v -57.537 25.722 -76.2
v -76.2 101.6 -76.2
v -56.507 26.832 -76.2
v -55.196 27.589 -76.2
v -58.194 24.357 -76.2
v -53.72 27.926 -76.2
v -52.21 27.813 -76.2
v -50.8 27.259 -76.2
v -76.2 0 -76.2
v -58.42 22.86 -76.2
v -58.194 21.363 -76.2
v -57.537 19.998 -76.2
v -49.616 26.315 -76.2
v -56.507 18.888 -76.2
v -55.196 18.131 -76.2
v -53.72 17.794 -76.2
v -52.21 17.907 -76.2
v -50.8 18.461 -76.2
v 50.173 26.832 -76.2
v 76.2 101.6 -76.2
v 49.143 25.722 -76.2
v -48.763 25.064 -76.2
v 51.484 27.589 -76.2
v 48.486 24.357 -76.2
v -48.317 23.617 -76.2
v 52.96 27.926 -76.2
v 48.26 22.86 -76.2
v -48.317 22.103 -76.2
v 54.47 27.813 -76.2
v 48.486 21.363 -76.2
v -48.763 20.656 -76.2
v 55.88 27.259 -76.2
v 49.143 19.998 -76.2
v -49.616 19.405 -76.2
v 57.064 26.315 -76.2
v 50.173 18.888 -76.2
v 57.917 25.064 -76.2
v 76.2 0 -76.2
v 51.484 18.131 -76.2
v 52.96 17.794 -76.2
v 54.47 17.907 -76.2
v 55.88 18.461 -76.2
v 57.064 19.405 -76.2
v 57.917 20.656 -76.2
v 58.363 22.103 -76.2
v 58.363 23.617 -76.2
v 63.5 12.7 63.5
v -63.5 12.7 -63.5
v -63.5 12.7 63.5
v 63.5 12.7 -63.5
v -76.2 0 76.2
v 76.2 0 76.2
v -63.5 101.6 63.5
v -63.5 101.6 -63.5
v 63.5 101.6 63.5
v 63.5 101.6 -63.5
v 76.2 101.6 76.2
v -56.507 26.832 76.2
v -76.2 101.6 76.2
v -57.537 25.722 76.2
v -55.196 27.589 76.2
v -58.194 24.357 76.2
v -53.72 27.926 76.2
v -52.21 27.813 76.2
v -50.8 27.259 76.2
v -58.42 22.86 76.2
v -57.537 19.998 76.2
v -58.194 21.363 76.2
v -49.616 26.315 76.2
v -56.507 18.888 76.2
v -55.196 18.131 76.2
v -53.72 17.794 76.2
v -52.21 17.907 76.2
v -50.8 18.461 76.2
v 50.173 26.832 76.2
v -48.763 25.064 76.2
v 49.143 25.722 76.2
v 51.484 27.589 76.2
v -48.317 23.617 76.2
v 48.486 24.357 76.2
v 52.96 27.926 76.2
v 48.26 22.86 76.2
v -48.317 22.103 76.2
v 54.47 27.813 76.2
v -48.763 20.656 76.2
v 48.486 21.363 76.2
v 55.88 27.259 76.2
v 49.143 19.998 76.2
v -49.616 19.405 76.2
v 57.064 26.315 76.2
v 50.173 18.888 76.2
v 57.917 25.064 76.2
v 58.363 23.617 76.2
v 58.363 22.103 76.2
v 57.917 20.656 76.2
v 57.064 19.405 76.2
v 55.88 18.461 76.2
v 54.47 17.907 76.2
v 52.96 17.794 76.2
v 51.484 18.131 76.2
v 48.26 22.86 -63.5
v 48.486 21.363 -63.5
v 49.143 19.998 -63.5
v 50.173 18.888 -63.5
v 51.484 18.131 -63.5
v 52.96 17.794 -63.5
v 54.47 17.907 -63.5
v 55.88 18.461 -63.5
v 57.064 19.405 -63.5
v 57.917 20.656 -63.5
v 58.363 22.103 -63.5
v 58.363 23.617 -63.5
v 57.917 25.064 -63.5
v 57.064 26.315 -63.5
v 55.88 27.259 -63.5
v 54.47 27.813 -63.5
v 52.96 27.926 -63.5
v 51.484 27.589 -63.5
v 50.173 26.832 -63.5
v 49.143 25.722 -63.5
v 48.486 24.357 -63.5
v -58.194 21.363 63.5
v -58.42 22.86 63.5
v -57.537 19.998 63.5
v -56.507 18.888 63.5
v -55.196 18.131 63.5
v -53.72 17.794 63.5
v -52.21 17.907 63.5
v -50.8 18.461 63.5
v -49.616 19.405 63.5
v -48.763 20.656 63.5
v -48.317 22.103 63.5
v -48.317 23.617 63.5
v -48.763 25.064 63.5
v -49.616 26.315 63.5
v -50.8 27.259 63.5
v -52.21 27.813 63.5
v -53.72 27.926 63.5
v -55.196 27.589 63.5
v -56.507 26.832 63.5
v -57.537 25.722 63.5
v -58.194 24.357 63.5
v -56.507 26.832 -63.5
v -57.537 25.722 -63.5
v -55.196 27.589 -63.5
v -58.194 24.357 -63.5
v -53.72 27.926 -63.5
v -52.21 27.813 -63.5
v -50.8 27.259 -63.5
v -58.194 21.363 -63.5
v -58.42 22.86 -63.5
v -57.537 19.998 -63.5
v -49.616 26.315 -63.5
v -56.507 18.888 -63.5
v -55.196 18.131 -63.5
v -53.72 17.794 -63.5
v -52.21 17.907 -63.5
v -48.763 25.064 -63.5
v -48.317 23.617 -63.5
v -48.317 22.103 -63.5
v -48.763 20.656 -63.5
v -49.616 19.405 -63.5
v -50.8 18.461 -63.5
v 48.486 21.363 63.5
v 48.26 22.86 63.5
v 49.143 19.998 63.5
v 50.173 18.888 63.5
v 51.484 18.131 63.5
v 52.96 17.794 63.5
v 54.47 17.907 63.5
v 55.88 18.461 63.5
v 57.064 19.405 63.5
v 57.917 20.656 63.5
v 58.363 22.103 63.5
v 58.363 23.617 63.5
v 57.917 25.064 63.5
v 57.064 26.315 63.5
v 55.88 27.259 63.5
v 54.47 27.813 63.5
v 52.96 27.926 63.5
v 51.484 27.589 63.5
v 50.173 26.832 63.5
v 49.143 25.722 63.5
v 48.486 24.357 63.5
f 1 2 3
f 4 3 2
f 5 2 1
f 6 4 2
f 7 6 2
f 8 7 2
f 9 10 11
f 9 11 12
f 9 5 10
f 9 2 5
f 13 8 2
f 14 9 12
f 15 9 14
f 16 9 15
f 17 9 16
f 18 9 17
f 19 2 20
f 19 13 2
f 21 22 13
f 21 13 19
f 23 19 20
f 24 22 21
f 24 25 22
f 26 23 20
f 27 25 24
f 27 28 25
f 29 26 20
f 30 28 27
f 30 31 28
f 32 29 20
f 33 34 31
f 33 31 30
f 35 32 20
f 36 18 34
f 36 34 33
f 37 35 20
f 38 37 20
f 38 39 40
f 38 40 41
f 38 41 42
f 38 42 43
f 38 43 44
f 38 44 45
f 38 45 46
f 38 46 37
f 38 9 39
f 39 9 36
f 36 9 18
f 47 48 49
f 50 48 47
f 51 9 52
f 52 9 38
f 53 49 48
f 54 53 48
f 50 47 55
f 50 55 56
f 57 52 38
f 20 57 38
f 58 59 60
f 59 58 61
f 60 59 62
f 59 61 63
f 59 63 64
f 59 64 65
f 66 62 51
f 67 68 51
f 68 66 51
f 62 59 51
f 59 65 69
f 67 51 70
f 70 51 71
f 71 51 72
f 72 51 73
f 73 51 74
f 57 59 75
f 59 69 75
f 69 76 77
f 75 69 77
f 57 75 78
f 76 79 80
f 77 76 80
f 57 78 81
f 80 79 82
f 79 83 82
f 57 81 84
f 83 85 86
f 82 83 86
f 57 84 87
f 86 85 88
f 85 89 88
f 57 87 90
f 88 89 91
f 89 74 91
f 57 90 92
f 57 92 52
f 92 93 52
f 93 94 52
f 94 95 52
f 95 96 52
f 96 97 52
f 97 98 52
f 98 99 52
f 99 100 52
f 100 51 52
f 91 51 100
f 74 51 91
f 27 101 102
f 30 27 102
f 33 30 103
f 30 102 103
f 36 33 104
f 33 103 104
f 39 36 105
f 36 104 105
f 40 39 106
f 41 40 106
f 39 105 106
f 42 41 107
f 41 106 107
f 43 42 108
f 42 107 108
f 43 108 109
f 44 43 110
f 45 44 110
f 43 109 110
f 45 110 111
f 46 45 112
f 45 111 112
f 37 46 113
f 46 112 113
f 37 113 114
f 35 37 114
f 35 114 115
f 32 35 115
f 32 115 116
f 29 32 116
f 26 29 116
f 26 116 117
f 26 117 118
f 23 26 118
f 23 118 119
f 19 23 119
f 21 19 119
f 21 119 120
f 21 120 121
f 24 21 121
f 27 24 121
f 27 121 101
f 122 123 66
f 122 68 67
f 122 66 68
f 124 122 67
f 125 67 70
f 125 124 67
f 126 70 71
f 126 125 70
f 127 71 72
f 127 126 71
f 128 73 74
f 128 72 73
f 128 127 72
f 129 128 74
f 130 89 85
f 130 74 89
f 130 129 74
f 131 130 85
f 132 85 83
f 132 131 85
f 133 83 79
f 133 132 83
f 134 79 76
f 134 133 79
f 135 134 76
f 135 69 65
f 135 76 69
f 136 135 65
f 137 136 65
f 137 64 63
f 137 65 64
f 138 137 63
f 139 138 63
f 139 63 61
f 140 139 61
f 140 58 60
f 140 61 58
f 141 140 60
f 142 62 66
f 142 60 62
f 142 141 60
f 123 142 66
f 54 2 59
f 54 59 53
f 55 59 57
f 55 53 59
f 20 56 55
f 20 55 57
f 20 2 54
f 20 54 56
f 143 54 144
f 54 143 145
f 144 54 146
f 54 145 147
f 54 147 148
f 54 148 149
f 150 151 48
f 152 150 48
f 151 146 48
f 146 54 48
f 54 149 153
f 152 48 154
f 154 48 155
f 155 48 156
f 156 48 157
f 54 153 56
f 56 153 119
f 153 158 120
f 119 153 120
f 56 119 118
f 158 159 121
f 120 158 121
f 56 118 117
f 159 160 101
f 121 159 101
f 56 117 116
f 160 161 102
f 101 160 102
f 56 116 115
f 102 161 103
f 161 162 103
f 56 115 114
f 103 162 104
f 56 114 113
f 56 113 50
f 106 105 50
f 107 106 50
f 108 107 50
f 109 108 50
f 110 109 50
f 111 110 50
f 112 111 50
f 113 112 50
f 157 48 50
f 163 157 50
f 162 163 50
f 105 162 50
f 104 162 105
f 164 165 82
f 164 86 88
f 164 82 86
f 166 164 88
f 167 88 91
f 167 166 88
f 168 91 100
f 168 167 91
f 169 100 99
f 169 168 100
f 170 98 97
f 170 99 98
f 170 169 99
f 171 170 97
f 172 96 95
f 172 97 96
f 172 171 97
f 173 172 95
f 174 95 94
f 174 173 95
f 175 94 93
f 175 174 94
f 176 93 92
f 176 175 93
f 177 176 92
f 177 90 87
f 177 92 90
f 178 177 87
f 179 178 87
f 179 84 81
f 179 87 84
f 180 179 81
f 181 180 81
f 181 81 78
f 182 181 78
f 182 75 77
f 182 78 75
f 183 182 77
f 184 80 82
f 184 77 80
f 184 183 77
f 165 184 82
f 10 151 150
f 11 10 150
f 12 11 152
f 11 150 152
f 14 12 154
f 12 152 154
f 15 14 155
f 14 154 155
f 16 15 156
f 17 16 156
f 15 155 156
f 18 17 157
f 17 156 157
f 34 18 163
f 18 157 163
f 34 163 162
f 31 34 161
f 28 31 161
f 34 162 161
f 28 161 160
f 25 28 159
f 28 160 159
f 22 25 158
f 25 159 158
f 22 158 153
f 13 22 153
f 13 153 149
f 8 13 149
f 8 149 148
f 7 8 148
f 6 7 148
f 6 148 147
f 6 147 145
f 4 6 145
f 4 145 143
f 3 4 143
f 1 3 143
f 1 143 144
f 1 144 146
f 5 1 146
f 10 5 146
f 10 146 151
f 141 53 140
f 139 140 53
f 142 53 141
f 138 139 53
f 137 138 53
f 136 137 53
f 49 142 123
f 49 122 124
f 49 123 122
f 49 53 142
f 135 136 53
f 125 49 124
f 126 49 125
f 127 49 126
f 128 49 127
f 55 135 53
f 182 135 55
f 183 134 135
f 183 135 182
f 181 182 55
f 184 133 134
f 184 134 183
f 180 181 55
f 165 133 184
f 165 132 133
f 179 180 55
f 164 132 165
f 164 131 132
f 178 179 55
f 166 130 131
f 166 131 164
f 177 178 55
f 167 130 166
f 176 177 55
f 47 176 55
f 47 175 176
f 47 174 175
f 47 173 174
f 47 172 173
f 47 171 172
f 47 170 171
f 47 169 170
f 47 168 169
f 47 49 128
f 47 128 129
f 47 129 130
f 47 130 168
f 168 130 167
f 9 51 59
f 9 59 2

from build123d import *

# Parameters (mm, degrees)
SKETCH1_W           = 152.4
SKETCH1_H           = 152.4
BOSS_EXTRUDE1_DEPTH = 101.6
SHELL1_T            = -12.7
SKETCH2_R           = 5.08
CUT_EXTRUDE1_DEPTH  = 189.799073091


with BuildPart() as part:
    # Sketch1 → Boss-Extrude1 (new body)
    with BuildSketch(Plane(origin=(0, 0, 0), x_dir=(1, 0, 0), z_dir=(0, 1, 0))):
        Rectangle(SKETCH1_W, SKETCH1_H)
    extrude(amount=BOSS_EXTRUDE1_DEPTH)

    # Shell1
    shell1_openings = [part.faces().sort_by_distance(p)[0] for p in [
        (0, 101.6, 0),
    ]]
    offset(amount=SHELL1_T, openings=shell1_openings, kind=Kind.INTERSECTION)

    # Sketch2 → Cut-Extrude1 (cut, through all)
    with BuildSketch(Plane.XY.offset(-63.5)):
        with Locations(Location((-53.34, 22.86, 0), (0, 0, 180))):
            Circle(SKETCH2_R)
        with Locations(Location((53.34, 22.86, 0), (0, 0, 180))):
            Circle(SKETCH2_R)
    cut_extrude1 = extrude(amount=CUT_EXTRUDE1_DEPTH, mode=Mode.SUBTRACT)

    # Mirror1: Cut-Extrude1 across plane
    add(cut_extrude1.mirror(Plane.XY), mode=Mode.SUBTRACT)


solid = part.part
